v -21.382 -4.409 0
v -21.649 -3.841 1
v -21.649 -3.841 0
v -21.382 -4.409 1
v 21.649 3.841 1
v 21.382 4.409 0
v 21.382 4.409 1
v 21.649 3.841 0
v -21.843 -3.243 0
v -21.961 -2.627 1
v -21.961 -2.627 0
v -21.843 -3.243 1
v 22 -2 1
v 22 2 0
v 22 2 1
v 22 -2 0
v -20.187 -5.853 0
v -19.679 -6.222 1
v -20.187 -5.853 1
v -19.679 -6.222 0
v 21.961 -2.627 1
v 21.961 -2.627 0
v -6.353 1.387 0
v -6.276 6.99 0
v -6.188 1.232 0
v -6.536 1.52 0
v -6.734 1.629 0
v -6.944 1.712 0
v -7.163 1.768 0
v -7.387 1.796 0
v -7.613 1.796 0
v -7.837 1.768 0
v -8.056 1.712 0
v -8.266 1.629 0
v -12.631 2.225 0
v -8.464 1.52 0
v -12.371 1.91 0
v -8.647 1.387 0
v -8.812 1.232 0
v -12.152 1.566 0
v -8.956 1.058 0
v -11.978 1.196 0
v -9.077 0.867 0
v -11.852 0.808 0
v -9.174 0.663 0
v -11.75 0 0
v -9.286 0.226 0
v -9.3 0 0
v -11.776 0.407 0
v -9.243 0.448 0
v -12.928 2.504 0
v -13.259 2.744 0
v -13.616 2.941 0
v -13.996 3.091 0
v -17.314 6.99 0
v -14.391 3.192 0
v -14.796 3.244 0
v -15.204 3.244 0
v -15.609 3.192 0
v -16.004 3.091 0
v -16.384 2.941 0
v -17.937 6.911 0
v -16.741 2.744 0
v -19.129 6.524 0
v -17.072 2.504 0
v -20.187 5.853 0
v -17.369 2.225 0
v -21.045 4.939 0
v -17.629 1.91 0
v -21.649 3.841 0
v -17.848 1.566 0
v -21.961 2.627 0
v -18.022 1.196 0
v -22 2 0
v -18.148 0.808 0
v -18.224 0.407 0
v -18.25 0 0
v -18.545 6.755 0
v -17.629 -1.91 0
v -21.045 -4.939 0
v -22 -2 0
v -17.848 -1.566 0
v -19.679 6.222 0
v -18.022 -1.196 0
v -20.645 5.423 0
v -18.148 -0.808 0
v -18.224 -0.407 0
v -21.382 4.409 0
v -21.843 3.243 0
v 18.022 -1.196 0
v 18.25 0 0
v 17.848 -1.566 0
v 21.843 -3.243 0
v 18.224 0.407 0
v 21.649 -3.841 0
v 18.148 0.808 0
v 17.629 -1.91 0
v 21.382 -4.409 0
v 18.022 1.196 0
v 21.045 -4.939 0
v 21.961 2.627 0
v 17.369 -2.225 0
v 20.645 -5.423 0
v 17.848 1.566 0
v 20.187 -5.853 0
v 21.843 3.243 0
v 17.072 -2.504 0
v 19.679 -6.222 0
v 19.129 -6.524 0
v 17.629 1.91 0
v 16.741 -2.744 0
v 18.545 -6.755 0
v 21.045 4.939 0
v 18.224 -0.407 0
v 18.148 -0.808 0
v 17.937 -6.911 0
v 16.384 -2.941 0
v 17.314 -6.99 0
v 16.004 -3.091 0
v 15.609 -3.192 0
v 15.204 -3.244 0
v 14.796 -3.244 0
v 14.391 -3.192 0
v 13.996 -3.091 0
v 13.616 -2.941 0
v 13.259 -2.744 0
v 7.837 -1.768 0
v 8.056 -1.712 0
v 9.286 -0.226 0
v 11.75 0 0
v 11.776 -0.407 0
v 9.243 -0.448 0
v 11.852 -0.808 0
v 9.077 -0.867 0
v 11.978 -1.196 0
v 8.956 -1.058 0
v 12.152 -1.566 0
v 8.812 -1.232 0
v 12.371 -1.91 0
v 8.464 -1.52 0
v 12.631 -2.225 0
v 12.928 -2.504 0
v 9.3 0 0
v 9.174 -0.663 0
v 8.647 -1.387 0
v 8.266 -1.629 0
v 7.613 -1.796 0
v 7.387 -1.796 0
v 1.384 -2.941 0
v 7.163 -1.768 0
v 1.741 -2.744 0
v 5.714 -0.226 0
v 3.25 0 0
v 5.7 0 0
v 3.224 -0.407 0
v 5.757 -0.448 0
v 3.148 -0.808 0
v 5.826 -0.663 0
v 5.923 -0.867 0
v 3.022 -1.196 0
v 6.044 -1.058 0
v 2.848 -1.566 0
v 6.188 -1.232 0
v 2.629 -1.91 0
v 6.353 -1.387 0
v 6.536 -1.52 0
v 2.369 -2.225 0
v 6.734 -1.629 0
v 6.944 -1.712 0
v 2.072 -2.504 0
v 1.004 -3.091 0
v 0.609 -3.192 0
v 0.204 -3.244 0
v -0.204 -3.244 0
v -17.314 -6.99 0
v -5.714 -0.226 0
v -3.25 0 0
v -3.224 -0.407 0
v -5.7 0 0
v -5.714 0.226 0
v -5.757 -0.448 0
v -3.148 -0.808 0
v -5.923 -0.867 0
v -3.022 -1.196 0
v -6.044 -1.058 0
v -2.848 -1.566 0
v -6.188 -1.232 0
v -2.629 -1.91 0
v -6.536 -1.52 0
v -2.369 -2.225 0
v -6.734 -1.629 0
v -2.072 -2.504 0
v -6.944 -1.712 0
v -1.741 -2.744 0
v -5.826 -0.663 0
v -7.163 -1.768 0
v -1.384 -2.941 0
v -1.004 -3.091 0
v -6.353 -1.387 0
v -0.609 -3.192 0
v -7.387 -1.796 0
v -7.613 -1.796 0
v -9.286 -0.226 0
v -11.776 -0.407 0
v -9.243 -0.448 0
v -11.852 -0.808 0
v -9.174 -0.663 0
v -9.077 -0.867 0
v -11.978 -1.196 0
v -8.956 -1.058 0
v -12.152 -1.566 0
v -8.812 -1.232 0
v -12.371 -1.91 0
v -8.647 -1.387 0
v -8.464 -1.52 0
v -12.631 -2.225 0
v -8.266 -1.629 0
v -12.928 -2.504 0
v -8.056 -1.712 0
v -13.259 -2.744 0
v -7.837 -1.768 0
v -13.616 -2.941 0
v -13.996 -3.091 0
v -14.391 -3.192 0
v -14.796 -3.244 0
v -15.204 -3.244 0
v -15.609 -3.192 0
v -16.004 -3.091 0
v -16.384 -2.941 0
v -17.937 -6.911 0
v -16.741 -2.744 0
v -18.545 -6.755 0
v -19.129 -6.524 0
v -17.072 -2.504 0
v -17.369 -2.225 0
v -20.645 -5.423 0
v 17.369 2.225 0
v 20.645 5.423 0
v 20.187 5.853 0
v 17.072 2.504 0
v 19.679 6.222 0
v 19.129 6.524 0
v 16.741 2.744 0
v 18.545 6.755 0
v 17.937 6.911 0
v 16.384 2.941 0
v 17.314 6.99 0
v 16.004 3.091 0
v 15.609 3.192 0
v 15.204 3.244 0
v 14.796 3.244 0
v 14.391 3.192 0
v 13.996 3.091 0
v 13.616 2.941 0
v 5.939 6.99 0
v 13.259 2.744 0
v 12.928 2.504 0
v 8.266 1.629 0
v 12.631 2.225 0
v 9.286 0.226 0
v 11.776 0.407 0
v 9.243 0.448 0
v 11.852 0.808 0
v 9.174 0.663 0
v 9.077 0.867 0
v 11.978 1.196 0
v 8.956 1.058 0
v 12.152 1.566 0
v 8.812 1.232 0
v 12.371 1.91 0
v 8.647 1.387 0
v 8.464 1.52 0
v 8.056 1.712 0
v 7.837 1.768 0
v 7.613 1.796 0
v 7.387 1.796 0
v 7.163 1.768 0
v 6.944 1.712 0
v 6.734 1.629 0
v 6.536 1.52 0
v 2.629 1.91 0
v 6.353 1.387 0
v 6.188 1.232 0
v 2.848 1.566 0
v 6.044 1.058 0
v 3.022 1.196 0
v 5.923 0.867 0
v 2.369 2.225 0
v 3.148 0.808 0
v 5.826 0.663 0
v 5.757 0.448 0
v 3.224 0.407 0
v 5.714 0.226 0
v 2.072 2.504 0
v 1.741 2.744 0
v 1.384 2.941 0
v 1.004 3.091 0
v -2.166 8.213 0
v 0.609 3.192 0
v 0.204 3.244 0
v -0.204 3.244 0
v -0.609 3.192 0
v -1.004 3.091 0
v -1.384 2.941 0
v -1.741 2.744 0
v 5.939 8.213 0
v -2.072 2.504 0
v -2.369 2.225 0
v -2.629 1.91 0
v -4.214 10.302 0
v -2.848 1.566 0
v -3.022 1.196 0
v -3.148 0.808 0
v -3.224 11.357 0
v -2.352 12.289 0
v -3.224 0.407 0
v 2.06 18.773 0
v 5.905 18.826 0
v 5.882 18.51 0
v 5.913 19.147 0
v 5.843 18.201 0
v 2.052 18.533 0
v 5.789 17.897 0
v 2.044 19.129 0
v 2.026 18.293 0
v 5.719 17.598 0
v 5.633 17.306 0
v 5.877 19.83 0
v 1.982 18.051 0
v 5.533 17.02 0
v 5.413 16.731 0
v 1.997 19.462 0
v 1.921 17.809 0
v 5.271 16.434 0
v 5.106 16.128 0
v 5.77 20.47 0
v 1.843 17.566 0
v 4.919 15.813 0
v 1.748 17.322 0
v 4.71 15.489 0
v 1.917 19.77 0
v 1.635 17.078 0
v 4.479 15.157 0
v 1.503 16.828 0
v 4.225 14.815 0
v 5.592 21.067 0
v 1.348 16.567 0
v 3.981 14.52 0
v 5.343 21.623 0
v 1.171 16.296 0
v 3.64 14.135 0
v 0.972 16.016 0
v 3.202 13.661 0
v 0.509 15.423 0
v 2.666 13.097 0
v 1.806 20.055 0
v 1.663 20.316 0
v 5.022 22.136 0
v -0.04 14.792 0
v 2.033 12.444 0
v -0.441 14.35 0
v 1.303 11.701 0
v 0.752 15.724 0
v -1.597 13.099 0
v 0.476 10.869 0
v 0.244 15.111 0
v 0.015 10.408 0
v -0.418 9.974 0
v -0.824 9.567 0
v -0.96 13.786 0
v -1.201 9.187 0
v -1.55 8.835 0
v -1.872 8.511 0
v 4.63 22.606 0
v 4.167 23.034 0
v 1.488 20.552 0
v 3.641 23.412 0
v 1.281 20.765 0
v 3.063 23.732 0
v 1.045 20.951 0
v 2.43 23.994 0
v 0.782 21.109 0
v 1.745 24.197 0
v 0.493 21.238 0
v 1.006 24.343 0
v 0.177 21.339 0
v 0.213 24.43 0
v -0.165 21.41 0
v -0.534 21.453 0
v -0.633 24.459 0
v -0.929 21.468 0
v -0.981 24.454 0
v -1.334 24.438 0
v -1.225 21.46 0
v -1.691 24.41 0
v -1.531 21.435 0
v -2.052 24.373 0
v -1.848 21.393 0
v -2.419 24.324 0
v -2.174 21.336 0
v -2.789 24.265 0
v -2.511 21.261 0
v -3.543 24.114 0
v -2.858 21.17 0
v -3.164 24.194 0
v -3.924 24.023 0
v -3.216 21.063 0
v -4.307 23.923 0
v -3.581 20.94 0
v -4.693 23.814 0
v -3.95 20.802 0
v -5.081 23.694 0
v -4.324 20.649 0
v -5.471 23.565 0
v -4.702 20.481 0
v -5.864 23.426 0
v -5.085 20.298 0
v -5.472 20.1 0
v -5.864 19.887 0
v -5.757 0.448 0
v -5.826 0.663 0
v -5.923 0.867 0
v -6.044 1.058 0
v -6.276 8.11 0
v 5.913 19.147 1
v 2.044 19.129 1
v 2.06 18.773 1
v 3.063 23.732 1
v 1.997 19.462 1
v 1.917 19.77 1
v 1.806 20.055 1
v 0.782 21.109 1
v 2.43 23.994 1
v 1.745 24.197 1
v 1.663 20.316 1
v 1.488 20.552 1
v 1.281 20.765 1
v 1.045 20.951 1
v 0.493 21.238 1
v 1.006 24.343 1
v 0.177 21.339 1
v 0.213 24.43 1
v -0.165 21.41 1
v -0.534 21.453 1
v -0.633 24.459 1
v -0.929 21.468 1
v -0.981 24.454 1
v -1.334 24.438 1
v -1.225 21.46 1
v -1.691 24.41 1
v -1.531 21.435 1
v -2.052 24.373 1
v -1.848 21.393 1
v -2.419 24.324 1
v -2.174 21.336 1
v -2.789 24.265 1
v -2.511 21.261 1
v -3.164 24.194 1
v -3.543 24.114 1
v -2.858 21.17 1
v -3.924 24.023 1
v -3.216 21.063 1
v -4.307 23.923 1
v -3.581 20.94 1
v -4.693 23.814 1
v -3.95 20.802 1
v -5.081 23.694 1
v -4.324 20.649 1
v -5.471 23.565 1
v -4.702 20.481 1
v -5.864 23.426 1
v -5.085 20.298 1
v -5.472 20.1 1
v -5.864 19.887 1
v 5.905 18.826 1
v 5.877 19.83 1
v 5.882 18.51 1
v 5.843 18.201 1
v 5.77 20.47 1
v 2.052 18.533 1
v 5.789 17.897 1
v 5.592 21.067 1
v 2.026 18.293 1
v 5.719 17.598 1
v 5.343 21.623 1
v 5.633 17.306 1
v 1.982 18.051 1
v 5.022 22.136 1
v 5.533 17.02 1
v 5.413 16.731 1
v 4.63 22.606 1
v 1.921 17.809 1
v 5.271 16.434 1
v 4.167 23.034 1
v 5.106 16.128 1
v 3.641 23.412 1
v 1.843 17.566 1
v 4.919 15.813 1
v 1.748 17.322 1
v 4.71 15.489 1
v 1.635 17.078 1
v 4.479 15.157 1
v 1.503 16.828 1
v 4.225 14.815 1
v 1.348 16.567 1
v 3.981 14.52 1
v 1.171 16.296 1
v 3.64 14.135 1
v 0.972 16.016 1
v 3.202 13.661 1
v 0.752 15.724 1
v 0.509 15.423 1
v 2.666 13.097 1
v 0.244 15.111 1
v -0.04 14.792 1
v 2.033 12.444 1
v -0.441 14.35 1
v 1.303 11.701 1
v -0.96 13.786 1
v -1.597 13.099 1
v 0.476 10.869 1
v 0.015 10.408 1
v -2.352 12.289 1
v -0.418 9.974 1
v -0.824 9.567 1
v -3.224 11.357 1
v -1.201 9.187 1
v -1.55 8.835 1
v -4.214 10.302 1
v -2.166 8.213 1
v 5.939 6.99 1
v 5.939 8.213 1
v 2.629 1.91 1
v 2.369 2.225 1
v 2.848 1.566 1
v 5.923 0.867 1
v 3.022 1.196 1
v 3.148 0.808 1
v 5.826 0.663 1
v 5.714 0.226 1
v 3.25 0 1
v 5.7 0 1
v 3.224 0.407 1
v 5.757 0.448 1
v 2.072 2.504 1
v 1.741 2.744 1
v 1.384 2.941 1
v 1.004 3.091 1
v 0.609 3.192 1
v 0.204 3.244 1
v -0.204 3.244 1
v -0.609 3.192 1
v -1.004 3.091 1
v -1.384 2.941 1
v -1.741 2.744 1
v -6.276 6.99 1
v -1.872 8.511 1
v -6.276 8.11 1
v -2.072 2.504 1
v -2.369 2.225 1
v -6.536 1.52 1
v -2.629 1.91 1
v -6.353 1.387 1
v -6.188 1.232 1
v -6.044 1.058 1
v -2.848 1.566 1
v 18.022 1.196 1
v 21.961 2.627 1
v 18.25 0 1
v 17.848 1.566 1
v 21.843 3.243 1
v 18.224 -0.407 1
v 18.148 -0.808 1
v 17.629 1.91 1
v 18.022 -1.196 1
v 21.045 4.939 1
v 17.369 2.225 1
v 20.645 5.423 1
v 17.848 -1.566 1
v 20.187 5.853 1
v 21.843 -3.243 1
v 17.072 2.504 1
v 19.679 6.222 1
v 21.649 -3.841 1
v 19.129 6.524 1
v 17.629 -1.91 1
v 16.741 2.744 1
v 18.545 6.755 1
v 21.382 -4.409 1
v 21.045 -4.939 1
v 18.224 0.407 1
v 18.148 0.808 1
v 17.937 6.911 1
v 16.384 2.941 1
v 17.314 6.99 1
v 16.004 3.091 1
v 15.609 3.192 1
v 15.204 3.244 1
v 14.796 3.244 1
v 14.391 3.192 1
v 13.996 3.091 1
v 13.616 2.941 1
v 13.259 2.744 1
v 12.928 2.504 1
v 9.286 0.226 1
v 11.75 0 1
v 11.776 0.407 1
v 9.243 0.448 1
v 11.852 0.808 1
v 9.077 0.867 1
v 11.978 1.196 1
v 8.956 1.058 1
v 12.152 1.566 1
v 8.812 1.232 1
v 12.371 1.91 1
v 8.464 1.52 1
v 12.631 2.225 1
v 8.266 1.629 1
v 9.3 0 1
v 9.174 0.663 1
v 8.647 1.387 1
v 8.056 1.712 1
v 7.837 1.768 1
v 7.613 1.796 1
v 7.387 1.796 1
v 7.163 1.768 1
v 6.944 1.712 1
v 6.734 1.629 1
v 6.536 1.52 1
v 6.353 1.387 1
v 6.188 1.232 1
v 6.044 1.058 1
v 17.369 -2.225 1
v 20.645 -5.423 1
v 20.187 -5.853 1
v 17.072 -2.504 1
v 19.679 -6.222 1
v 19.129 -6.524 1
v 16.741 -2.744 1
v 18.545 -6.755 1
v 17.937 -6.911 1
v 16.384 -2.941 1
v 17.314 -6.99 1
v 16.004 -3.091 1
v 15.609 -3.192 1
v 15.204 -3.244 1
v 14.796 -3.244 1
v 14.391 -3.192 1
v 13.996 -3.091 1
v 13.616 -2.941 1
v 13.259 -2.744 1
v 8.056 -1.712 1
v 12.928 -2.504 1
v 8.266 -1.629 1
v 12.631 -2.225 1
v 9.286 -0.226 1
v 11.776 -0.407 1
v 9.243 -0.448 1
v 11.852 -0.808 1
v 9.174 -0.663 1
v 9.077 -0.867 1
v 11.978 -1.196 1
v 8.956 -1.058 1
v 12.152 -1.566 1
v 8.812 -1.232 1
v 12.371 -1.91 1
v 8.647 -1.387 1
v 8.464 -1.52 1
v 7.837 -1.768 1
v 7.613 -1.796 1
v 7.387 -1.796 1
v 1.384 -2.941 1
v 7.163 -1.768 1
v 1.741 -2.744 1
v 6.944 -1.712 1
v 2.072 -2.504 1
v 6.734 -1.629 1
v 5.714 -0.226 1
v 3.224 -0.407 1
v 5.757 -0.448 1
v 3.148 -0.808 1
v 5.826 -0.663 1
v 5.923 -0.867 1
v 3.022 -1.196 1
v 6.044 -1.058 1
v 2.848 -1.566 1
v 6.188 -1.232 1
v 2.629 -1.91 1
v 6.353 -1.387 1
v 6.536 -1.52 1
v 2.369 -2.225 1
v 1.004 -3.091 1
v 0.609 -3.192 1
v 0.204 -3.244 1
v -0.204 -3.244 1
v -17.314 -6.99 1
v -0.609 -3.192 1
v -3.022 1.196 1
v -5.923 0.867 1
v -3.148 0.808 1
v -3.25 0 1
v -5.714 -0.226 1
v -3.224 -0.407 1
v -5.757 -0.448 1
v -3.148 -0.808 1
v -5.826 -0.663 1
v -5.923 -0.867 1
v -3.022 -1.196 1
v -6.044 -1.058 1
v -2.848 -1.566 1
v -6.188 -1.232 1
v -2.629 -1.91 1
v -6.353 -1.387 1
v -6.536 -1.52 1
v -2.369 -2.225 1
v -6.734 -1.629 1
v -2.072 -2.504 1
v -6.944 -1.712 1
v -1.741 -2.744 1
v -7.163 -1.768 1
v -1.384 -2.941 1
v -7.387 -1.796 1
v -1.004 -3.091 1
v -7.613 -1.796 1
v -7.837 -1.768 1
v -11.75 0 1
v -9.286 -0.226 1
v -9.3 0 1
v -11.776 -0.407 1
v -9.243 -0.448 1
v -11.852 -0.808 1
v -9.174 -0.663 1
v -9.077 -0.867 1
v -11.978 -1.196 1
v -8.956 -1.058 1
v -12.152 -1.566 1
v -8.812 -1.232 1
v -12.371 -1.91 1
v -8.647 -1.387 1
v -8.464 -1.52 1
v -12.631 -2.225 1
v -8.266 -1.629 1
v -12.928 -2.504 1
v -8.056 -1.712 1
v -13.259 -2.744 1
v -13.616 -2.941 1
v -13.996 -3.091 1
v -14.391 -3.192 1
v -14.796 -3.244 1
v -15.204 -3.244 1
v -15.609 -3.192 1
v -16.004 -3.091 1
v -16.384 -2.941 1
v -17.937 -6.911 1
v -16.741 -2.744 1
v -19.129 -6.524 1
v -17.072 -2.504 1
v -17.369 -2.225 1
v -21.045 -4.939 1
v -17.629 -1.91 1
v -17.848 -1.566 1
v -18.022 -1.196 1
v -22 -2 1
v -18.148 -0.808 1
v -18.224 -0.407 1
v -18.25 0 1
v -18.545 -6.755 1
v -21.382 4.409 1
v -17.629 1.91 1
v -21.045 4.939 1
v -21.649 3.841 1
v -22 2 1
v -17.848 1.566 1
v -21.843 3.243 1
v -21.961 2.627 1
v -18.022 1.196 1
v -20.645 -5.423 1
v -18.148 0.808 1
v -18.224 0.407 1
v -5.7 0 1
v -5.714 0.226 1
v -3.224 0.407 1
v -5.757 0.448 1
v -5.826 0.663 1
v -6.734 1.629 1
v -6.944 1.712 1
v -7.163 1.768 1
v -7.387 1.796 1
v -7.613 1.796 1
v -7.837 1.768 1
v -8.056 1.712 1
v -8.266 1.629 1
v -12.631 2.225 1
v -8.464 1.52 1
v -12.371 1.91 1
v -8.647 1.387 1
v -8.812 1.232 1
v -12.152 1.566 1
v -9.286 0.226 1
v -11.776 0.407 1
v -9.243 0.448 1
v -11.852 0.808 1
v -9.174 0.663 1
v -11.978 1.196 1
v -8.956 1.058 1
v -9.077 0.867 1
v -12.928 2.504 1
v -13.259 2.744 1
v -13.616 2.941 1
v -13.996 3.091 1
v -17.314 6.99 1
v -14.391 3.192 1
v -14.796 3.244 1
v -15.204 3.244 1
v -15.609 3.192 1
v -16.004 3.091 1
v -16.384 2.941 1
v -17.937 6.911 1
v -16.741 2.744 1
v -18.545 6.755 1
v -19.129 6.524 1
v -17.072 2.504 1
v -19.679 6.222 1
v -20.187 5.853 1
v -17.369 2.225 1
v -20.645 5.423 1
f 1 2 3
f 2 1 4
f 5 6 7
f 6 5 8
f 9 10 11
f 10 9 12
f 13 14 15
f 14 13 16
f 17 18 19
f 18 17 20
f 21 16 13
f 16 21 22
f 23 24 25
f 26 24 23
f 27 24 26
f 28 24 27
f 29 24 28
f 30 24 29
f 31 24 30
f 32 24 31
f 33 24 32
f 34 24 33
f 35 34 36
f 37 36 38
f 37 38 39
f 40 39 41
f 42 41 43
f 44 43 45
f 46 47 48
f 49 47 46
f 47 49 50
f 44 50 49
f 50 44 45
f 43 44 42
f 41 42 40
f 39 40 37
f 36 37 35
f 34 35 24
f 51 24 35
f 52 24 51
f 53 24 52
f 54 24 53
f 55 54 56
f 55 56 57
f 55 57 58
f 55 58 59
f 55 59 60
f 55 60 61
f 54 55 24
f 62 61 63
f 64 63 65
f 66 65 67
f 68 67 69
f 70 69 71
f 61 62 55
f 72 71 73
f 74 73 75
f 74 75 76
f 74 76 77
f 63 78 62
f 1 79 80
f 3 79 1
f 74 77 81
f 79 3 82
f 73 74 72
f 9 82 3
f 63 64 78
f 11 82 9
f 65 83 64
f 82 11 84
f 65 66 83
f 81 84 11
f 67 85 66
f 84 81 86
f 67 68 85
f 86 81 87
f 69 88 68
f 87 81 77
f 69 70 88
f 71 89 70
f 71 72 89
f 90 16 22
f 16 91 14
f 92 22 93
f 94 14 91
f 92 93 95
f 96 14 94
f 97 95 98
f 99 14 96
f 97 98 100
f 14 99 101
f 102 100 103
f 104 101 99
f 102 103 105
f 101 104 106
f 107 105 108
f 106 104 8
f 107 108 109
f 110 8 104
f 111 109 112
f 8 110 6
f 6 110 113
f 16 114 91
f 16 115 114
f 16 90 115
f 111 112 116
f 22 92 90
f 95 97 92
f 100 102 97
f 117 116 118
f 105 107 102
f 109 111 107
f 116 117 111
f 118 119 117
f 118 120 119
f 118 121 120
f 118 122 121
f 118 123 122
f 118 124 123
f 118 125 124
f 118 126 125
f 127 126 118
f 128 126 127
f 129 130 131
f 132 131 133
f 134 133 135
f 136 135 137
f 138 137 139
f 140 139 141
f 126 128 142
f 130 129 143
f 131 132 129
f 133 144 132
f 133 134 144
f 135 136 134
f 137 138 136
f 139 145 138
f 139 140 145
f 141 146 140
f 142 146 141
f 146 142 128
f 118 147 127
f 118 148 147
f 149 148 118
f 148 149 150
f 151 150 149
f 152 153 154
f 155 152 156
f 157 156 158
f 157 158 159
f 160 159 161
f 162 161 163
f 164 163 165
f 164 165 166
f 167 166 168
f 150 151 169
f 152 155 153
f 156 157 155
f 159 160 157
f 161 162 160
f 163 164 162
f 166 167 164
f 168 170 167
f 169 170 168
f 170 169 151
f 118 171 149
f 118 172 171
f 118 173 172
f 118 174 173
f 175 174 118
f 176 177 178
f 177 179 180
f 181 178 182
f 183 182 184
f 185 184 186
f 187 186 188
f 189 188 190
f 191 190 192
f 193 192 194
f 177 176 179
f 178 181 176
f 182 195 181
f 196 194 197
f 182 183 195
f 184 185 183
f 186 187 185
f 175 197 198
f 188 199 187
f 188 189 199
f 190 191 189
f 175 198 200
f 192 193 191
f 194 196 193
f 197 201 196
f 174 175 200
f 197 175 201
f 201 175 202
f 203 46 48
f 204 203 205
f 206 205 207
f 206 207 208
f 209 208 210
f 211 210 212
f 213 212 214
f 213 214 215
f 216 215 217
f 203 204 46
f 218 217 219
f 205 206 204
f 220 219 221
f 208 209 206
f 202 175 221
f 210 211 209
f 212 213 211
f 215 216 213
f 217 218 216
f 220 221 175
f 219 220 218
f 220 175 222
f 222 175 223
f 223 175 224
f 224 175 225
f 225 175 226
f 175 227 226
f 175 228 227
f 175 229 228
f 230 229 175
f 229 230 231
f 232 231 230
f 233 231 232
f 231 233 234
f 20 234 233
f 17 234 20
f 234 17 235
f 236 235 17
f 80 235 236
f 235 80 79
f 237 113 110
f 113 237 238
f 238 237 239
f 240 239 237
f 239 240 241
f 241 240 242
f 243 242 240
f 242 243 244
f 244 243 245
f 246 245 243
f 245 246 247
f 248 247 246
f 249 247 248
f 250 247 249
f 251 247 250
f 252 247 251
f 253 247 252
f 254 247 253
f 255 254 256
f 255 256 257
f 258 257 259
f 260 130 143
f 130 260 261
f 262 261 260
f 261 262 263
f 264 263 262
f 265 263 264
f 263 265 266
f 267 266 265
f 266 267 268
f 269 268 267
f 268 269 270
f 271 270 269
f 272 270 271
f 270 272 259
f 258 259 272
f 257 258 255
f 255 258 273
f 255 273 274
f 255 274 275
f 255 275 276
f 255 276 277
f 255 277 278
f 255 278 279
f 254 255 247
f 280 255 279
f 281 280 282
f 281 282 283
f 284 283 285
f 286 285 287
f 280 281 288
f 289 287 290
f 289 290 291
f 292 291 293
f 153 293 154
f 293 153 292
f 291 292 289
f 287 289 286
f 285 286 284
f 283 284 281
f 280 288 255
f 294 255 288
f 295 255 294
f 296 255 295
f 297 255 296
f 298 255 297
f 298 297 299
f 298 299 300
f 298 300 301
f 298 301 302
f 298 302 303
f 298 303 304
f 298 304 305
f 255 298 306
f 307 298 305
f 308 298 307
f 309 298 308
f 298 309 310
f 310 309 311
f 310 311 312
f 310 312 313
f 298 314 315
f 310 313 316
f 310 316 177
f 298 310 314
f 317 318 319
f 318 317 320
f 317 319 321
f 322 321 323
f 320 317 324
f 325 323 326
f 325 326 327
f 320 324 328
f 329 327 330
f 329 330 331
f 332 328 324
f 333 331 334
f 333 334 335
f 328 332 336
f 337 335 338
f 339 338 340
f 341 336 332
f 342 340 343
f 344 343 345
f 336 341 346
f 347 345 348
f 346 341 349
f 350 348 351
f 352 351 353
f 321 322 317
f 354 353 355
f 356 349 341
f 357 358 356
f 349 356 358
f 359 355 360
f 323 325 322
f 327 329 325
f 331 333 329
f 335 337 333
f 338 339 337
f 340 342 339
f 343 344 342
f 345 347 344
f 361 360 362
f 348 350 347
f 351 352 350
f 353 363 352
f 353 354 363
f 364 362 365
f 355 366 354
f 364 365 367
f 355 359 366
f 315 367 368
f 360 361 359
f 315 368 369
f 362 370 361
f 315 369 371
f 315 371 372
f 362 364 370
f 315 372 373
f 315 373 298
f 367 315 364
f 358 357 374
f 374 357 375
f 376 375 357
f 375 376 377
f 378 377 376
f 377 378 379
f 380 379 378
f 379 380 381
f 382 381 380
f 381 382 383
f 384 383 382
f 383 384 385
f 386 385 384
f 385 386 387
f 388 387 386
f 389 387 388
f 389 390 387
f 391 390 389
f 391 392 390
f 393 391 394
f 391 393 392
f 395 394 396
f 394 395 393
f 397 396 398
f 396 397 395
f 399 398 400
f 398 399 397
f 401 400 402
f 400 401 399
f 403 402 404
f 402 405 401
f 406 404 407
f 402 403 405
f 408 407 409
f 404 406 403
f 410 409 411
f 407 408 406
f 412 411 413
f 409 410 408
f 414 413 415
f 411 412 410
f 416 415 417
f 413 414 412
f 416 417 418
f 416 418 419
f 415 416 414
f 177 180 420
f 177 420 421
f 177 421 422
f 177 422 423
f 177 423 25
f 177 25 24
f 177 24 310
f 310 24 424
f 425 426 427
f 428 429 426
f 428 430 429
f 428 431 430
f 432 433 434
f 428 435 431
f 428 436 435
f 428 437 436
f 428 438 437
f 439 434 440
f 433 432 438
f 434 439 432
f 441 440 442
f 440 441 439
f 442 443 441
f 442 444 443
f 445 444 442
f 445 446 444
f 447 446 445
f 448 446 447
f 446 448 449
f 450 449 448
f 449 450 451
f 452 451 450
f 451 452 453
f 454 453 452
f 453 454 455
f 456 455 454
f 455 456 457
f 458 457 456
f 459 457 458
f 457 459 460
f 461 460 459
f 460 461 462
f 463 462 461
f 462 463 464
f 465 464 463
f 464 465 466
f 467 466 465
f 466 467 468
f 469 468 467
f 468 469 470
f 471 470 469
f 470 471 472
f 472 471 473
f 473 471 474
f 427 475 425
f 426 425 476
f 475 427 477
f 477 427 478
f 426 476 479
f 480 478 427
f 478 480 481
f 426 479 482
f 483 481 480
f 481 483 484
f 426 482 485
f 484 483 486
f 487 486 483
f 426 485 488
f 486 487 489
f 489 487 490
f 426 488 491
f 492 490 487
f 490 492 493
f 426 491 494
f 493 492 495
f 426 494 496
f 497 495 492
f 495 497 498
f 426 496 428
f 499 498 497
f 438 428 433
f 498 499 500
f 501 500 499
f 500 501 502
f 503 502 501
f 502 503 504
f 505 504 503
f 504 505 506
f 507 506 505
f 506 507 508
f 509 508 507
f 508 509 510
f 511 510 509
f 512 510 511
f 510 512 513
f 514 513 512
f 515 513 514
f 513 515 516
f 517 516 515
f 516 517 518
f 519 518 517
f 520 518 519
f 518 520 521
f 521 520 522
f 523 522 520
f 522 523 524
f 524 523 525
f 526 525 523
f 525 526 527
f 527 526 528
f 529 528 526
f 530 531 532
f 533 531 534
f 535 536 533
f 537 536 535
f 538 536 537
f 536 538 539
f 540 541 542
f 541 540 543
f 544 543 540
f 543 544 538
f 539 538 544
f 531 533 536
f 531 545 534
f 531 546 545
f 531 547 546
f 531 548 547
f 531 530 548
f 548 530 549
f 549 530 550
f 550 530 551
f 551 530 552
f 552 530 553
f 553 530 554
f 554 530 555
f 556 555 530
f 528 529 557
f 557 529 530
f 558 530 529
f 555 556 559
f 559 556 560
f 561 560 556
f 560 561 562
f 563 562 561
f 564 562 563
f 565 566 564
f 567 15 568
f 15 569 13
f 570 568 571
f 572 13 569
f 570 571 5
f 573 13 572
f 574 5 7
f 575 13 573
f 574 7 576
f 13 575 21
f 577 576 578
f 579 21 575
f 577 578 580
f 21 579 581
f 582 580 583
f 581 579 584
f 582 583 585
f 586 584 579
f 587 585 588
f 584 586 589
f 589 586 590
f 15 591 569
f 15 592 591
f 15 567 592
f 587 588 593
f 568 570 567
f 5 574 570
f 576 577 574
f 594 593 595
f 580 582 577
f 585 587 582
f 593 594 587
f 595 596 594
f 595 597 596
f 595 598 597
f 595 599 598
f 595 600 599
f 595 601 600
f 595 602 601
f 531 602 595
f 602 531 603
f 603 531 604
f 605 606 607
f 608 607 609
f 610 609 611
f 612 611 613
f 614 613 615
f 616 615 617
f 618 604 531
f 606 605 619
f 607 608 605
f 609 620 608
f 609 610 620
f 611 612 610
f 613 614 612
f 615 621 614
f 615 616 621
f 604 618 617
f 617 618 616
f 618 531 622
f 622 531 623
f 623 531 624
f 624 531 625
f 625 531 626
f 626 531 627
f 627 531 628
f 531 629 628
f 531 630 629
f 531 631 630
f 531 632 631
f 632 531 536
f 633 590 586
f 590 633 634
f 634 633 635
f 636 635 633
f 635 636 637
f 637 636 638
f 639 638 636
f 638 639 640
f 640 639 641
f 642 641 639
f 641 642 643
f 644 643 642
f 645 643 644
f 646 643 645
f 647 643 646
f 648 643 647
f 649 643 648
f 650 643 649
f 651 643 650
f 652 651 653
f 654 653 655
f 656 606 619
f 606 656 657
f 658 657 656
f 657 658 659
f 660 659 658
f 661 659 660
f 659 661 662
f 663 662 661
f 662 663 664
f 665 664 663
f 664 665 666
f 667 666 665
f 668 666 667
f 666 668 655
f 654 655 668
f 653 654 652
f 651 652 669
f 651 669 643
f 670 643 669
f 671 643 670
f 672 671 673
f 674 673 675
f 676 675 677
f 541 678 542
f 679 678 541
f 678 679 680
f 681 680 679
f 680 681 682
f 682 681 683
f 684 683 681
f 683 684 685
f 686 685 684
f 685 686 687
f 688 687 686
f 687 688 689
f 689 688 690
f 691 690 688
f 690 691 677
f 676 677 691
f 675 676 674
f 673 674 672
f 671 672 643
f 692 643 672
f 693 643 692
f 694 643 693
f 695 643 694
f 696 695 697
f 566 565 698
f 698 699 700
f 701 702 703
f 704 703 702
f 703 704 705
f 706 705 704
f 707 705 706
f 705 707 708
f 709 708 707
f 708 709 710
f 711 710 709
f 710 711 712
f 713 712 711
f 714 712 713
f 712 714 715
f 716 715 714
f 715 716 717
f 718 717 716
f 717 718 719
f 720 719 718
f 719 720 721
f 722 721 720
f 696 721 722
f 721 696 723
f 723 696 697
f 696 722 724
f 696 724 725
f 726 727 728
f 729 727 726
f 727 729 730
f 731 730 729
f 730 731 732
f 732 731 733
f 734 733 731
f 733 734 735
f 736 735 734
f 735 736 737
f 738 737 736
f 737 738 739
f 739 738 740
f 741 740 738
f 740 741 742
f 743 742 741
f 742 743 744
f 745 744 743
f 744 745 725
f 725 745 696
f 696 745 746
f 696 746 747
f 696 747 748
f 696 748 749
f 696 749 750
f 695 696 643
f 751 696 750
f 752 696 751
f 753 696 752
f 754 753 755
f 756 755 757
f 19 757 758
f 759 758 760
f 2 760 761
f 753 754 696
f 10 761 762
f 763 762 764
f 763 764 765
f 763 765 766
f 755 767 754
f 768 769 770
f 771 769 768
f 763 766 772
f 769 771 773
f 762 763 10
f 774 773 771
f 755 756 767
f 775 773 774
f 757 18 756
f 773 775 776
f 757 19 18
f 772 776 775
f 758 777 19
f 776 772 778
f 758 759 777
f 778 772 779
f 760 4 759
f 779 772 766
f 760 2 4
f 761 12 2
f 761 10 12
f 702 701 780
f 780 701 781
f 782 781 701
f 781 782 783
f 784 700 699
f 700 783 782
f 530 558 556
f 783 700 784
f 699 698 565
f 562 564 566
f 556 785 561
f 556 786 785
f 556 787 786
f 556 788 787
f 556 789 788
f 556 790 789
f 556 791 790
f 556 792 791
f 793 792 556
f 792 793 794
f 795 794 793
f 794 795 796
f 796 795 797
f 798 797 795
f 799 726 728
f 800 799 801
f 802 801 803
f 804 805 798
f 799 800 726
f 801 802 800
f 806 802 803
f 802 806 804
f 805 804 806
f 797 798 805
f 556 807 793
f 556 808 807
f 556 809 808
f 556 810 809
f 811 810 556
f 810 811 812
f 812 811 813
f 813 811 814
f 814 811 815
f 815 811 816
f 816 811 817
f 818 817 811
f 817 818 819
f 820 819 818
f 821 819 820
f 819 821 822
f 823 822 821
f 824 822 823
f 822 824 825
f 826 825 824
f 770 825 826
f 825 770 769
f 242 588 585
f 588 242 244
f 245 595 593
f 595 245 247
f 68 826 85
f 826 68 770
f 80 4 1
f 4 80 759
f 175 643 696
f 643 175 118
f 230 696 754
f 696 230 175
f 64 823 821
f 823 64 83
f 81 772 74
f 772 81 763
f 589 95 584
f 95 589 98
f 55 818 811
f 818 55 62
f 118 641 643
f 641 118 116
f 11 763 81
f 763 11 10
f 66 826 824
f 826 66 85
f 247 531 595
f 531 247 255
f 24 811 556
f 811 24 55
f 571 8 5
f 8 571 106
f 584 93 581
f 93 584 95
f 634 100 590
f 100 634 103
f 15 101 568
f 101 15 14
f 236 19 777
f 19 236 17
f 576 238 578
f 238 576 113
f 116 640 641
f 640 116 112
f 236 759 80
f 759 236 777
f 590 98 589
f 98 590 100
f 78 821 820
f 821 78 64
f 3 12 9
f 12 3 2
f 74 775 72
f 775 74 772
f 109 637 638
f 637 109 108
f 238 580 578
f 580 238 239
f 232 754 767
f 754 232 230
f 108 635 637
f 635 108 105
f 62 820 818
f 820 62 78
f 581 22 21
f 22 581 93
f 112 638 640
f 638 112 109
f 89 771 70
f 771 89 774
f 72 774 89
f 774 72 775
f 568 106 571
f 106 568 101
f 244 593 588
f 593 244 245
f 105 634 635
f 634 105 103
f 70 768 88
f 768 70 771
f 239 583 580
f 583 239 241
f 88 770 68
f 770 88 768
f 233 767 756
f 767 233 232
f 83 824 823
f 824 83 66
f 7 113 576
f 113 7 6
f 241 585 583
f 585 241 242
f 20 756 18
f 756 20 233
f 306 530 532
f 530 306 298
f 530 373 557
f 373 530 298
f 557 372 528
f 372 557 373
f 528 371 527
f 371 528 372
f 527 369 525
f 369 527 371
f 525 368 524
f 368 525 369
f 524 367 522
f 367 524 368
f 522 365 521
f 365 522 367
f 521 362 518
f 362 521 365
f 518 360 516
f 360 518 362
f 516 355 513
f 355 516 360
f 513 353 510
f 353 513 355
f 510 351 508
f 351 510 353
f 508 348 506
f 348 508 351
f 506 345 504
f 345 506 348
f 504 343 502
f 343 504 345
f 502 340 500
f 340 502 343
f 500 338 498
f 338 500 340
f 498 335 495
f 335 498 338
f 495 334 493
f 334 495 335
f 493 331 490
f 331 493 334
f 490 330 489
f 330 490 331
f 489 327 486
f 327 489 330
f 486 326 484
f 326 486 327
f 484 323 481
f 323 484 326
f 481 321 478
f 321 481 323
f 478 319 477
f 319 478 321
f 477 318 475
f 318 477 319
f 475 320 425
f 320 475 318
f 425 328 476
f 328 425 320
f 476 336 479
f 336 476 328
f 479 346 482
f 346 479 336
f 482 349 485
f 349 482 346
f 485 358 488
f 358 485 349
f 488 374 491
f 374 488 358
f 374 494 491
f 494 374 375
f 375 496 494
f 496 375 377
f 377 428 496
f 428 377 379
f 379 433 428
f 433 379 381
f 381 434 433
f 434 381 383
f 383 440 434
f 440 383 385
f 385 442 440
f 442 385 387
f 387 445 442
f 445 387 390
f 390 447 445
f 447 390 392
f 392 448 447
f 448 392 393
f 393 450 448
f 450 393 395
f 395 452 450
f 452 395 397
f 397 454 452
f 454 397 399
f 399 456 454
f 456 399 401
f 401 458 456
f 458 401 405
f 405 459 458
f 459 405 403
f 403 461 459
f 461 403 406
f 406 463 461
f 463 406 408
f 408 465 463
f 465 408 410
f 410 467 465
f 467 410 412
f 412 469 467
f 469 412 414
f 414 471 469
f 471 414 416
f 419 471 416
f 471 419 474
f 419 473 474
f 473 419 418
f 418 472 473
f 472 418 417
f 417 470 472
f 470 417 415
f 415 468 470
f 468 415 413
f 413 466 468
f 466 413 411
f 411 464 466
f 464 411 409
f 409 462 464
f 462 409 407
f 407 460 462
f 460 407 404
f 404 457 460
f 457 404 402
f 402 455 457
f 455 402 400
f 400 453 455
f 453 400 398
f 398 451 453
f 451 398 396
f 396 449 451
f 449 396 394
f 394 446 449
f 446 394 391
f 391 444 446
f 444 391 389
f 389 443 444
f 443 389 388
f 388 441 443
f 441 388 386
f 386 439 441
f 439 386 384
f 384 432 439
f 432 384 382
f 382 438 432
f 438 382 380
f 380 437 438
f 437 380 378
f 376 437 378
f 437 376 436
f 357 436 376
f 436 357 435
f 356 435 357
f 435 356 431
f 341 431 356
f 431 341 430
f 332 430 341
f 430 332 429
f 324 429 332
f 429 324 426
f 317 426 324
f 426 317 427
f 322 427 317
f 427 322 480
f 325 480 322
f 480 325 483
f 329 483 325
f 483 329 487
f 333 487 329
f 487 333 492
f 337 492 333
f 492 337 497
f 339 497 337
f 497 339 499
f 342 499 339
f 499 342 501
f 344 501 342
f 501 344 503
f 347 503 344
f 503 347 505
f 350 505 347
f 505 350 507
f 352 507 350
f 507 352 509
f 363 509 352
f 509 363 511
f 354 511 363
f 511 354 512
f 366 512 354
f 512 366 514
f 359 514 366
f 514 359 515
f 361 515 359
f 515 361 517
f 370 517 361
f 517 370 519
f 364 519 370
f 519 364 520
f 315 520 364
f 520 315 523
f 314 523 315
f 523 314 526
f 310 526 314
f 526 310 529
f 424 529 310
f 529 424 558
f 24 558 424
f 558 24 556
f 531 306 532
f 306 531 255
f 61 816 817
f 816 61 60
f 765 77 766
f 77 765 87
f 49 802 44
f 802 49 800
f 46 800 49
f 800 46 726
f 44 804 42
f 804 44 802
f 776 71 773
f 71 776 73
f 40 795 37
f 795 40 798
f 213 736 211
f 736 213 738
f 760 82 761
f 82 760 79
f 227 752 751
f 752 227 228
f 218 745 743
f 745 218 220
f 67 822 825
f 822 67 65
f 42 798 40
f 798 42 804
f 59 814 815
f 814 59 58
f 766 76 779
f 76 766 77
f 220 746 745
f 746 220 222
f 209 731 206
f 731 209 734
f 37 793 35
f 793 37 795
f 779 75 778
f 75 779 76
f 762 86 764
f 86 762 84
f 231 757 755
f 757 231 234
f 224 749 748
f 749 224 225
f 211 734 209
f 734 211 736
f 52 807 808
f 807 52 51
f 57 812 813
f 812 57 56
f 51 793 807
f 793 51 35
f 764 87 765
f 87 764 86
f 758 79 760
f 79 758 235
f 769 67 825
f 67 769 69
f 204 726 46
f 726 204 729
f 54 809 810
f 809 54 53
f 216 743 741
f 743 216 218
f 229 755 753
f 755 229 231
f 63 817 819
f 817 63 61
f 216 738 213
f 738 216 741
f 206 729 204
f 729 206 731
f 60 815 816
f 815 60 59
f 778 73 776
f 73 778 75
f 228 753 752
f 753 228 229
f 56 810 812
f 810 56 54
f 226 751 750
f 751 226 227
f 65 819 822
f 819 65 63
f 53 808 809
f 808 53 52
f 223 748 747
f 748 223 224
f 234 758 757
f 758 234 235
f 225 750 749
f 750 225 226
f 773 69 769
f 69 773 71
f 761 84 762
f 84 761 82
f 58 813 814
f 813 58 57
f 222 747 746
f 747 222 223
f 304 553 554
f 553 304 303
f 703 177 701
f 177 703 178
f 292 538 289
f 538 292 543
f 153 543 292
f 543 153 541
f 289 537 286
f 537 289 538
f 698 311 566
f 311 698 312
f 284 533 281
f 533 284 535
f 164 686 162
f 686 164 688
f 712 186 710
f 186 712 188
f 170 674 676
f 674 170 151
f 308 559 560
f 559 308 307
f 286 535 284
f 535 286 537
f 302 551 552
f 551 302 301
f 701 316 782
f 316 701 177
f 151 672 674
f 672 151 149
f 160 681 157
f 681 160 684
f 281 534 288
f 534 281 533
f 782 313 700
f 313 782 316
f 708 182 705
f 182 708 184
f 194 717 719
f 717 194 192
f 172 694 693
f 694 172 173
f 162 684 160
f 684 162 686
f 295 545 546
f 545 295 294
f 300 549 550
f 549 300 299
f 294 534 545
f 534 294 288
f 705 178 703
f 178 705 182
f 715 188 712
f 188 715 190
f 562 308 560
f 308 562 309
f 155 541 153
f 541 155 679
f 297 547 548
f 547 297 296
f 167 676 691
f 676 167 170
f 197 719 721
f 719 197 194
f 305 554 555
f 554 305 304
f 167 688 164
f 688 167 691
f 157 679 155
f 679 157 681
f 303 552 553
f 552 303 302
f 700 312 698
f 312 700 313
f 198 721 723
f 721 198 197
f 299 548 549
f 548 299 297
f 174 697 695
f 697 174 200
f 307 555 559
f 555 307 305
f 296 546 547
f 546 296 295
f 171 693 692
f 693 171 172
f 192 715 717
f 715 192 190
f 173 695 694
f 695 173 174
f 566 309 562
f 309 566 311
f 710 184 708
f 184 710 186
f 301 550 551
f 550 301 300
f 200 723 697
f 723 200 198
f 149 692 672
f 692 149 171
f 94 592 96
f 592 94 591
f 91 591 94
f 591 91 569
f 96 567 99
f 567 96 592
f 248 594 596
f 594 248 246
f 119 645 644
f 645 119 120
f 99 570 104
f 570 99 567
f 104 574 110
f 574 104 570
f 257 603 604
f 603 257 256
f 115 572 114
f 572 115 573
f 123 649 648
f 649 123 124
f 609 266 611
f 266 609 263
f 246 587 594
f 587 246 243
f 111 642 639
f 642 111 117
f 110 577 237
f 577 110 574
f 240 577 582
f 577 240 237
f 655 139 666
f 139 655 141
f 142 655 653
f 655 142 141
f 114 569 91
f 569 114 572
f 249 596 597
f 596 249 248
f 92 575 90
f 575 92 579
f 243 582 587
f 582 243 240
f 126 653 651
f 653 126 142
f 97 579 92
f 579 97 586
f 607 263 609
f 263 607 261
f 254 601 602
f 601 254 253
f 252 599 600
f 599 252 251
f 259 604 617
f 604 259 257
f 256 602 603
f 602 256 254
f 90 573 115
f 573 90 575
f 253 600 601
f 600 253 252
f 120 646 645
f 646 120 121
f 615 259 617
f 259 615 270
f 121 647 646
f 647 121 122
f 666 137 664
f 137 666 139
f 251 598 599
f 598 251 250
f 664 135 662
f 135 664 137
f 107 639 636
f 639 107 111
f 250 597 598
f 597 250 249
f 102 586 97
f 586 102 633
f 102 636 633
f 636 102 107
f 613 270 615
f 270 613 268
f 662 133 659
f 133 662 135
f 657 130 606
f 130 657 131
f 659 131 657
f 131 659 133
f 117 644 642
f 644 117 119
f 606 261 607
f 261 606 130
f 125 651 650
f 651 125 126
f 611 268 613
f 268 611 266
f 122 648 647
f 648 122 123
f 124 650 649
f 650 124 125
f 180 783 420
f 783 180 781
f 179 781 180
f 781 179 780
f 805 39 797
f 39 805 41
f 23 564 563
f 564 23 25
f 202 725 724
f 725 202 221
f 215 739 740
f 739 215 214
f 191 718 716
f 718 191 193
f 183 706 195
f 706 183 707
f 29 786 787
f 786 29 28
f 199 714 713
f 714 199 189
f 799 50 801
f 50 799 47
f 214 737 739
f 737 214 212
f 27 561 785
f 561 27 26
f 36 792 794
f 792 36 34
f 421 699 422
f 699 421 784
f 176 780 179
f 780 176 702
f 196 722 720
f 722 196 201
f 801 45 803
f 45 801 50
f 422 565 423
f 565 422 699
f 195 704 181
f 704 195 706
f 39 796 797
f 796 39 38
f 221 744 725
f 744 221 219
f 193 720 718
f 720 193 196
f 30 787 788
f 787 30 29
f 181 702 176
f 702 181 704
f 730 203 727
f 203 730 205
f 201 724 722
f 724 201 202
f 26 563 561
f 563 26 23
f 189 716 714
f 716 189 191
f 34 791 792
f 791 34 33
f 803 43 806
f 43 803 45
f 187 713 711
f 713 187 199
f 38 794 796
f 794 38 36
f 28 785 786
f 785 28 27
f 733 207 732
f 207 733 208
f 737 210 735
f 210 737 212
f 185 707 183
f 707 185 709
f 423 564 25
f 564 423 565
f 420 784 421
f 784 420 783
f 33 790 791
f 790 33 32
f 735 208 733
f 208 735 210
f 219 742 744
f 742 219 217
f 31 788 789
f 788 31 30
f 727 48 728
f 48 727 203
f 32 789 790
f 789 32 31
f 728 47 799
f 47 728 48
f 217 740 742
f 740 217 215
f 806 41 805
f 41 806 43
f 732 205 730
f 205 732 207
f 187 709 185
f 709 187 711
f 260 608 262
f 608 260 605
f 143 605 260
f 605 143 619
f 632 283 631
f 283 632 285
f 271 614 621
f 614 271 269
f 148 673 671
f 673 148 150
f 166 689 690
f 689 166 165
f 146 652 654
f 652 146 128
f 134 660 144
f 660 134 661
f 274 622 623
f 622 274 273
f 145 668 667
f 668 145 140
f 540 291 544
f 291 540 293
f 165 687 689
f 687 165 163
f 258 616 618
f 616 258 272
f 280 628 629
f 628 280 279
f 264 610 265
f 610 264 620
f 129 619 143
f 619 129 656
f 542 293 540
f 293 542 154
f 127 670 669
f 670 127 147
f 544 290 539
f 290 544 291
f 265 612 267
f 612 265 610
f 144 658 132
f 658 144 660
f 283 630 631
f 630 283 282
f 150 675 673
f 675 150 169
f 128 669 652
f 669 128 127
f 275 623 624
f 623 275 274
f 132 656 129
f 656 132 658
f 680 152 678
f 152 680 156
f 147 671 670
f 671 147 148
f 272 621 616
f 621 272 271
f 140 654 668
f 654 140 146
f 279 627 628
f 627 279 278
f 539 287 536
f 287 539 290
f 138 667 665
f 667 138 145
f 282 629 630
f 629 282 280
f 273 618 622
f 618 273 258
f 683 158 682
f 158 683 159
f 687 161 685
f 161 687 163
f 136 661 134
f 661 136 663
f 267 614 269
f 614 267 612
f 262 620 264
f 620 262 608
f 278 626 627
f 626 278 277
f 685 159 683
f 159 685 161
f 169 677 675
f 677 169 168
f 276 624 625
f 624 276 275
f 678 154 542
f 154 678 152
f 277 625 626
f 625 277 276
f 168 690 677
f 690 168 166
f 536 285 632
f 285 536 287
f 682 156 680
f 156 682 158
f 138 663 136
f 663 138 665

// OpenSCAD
$fn = 50;


difference() {
	union() {
		hull() {
			translate(v = [-17.0000000000, 2.0000000000, 0]) {
				cylinder(h = 1, r = 5);
			}
			translate(v = [17.0000000000, 2.0000000000, 0]) {
				cylinder(h = 1, r = 5);
			}
			translate(v = [-17.0000000000, -2.0000000000, 0]) {
				cylinder(h = 1, r = 5);
			}
			translate(v = [17.0000000000, -2.0000000000, 0]) {
				cylinder(h = 1, r = 5);
			}
		}
		translate(v = [0, 24, 0]) {
			linear_extrude(height = 1) {
				text(font = "DejaVu Sans Mono:style=Bold", halign = "center", size = 19.0000000000, text = "2", valign = "top");
			}
		}
	}
	union() {
		translate(v = [-15.0000000000, 0.0000000000, 0]) {
			translate(v = [0, 0, -100]) {
				cylinder(h = 200, r = 3.2500000000);
			}
		}
		translate(v = [0, 0, -100]) {
			cylinder(h = 200, r = 3.2500000000);
		}
		translate(v = [15.0000000000, 0.0000000000, 0]) {
			translate(v = [0, 0, -100]) {
				cylinder(h = 200, r = 3.2500000000);
			}
		}
		translate(v = [-15.0000000000, 0.0000000000, 0]) {
			translate(v = [0, 0, -100]) {
				cylinder(h = 200, r = 1.8000000000);
			}
		}
		translate(v = [-7.5000000000, 0.0000000000, 0]) {
			translate(v = [0, 0, -100]) {
				cylinder(h = 200, r = 1.8000000000);
			}
		}
		translate(v = [0, 0, -100]) {
			cylinder(h = 200, r = 1.8000000000);
		}
		translate(v = [7.5000000000, 0.0000000000, 0]) {
			translate(v = [0, 0, -100]) {
				cylinder(h = 200, r = 1.8000000000);
			}
		}
		translate(v = [15.0000000000, 0.0000000000, 0]) {
			translate(v = [0, 0, -100]) {
				cylinder(h = 200, r = 1.8000000000);
			}
		}
	}
}
